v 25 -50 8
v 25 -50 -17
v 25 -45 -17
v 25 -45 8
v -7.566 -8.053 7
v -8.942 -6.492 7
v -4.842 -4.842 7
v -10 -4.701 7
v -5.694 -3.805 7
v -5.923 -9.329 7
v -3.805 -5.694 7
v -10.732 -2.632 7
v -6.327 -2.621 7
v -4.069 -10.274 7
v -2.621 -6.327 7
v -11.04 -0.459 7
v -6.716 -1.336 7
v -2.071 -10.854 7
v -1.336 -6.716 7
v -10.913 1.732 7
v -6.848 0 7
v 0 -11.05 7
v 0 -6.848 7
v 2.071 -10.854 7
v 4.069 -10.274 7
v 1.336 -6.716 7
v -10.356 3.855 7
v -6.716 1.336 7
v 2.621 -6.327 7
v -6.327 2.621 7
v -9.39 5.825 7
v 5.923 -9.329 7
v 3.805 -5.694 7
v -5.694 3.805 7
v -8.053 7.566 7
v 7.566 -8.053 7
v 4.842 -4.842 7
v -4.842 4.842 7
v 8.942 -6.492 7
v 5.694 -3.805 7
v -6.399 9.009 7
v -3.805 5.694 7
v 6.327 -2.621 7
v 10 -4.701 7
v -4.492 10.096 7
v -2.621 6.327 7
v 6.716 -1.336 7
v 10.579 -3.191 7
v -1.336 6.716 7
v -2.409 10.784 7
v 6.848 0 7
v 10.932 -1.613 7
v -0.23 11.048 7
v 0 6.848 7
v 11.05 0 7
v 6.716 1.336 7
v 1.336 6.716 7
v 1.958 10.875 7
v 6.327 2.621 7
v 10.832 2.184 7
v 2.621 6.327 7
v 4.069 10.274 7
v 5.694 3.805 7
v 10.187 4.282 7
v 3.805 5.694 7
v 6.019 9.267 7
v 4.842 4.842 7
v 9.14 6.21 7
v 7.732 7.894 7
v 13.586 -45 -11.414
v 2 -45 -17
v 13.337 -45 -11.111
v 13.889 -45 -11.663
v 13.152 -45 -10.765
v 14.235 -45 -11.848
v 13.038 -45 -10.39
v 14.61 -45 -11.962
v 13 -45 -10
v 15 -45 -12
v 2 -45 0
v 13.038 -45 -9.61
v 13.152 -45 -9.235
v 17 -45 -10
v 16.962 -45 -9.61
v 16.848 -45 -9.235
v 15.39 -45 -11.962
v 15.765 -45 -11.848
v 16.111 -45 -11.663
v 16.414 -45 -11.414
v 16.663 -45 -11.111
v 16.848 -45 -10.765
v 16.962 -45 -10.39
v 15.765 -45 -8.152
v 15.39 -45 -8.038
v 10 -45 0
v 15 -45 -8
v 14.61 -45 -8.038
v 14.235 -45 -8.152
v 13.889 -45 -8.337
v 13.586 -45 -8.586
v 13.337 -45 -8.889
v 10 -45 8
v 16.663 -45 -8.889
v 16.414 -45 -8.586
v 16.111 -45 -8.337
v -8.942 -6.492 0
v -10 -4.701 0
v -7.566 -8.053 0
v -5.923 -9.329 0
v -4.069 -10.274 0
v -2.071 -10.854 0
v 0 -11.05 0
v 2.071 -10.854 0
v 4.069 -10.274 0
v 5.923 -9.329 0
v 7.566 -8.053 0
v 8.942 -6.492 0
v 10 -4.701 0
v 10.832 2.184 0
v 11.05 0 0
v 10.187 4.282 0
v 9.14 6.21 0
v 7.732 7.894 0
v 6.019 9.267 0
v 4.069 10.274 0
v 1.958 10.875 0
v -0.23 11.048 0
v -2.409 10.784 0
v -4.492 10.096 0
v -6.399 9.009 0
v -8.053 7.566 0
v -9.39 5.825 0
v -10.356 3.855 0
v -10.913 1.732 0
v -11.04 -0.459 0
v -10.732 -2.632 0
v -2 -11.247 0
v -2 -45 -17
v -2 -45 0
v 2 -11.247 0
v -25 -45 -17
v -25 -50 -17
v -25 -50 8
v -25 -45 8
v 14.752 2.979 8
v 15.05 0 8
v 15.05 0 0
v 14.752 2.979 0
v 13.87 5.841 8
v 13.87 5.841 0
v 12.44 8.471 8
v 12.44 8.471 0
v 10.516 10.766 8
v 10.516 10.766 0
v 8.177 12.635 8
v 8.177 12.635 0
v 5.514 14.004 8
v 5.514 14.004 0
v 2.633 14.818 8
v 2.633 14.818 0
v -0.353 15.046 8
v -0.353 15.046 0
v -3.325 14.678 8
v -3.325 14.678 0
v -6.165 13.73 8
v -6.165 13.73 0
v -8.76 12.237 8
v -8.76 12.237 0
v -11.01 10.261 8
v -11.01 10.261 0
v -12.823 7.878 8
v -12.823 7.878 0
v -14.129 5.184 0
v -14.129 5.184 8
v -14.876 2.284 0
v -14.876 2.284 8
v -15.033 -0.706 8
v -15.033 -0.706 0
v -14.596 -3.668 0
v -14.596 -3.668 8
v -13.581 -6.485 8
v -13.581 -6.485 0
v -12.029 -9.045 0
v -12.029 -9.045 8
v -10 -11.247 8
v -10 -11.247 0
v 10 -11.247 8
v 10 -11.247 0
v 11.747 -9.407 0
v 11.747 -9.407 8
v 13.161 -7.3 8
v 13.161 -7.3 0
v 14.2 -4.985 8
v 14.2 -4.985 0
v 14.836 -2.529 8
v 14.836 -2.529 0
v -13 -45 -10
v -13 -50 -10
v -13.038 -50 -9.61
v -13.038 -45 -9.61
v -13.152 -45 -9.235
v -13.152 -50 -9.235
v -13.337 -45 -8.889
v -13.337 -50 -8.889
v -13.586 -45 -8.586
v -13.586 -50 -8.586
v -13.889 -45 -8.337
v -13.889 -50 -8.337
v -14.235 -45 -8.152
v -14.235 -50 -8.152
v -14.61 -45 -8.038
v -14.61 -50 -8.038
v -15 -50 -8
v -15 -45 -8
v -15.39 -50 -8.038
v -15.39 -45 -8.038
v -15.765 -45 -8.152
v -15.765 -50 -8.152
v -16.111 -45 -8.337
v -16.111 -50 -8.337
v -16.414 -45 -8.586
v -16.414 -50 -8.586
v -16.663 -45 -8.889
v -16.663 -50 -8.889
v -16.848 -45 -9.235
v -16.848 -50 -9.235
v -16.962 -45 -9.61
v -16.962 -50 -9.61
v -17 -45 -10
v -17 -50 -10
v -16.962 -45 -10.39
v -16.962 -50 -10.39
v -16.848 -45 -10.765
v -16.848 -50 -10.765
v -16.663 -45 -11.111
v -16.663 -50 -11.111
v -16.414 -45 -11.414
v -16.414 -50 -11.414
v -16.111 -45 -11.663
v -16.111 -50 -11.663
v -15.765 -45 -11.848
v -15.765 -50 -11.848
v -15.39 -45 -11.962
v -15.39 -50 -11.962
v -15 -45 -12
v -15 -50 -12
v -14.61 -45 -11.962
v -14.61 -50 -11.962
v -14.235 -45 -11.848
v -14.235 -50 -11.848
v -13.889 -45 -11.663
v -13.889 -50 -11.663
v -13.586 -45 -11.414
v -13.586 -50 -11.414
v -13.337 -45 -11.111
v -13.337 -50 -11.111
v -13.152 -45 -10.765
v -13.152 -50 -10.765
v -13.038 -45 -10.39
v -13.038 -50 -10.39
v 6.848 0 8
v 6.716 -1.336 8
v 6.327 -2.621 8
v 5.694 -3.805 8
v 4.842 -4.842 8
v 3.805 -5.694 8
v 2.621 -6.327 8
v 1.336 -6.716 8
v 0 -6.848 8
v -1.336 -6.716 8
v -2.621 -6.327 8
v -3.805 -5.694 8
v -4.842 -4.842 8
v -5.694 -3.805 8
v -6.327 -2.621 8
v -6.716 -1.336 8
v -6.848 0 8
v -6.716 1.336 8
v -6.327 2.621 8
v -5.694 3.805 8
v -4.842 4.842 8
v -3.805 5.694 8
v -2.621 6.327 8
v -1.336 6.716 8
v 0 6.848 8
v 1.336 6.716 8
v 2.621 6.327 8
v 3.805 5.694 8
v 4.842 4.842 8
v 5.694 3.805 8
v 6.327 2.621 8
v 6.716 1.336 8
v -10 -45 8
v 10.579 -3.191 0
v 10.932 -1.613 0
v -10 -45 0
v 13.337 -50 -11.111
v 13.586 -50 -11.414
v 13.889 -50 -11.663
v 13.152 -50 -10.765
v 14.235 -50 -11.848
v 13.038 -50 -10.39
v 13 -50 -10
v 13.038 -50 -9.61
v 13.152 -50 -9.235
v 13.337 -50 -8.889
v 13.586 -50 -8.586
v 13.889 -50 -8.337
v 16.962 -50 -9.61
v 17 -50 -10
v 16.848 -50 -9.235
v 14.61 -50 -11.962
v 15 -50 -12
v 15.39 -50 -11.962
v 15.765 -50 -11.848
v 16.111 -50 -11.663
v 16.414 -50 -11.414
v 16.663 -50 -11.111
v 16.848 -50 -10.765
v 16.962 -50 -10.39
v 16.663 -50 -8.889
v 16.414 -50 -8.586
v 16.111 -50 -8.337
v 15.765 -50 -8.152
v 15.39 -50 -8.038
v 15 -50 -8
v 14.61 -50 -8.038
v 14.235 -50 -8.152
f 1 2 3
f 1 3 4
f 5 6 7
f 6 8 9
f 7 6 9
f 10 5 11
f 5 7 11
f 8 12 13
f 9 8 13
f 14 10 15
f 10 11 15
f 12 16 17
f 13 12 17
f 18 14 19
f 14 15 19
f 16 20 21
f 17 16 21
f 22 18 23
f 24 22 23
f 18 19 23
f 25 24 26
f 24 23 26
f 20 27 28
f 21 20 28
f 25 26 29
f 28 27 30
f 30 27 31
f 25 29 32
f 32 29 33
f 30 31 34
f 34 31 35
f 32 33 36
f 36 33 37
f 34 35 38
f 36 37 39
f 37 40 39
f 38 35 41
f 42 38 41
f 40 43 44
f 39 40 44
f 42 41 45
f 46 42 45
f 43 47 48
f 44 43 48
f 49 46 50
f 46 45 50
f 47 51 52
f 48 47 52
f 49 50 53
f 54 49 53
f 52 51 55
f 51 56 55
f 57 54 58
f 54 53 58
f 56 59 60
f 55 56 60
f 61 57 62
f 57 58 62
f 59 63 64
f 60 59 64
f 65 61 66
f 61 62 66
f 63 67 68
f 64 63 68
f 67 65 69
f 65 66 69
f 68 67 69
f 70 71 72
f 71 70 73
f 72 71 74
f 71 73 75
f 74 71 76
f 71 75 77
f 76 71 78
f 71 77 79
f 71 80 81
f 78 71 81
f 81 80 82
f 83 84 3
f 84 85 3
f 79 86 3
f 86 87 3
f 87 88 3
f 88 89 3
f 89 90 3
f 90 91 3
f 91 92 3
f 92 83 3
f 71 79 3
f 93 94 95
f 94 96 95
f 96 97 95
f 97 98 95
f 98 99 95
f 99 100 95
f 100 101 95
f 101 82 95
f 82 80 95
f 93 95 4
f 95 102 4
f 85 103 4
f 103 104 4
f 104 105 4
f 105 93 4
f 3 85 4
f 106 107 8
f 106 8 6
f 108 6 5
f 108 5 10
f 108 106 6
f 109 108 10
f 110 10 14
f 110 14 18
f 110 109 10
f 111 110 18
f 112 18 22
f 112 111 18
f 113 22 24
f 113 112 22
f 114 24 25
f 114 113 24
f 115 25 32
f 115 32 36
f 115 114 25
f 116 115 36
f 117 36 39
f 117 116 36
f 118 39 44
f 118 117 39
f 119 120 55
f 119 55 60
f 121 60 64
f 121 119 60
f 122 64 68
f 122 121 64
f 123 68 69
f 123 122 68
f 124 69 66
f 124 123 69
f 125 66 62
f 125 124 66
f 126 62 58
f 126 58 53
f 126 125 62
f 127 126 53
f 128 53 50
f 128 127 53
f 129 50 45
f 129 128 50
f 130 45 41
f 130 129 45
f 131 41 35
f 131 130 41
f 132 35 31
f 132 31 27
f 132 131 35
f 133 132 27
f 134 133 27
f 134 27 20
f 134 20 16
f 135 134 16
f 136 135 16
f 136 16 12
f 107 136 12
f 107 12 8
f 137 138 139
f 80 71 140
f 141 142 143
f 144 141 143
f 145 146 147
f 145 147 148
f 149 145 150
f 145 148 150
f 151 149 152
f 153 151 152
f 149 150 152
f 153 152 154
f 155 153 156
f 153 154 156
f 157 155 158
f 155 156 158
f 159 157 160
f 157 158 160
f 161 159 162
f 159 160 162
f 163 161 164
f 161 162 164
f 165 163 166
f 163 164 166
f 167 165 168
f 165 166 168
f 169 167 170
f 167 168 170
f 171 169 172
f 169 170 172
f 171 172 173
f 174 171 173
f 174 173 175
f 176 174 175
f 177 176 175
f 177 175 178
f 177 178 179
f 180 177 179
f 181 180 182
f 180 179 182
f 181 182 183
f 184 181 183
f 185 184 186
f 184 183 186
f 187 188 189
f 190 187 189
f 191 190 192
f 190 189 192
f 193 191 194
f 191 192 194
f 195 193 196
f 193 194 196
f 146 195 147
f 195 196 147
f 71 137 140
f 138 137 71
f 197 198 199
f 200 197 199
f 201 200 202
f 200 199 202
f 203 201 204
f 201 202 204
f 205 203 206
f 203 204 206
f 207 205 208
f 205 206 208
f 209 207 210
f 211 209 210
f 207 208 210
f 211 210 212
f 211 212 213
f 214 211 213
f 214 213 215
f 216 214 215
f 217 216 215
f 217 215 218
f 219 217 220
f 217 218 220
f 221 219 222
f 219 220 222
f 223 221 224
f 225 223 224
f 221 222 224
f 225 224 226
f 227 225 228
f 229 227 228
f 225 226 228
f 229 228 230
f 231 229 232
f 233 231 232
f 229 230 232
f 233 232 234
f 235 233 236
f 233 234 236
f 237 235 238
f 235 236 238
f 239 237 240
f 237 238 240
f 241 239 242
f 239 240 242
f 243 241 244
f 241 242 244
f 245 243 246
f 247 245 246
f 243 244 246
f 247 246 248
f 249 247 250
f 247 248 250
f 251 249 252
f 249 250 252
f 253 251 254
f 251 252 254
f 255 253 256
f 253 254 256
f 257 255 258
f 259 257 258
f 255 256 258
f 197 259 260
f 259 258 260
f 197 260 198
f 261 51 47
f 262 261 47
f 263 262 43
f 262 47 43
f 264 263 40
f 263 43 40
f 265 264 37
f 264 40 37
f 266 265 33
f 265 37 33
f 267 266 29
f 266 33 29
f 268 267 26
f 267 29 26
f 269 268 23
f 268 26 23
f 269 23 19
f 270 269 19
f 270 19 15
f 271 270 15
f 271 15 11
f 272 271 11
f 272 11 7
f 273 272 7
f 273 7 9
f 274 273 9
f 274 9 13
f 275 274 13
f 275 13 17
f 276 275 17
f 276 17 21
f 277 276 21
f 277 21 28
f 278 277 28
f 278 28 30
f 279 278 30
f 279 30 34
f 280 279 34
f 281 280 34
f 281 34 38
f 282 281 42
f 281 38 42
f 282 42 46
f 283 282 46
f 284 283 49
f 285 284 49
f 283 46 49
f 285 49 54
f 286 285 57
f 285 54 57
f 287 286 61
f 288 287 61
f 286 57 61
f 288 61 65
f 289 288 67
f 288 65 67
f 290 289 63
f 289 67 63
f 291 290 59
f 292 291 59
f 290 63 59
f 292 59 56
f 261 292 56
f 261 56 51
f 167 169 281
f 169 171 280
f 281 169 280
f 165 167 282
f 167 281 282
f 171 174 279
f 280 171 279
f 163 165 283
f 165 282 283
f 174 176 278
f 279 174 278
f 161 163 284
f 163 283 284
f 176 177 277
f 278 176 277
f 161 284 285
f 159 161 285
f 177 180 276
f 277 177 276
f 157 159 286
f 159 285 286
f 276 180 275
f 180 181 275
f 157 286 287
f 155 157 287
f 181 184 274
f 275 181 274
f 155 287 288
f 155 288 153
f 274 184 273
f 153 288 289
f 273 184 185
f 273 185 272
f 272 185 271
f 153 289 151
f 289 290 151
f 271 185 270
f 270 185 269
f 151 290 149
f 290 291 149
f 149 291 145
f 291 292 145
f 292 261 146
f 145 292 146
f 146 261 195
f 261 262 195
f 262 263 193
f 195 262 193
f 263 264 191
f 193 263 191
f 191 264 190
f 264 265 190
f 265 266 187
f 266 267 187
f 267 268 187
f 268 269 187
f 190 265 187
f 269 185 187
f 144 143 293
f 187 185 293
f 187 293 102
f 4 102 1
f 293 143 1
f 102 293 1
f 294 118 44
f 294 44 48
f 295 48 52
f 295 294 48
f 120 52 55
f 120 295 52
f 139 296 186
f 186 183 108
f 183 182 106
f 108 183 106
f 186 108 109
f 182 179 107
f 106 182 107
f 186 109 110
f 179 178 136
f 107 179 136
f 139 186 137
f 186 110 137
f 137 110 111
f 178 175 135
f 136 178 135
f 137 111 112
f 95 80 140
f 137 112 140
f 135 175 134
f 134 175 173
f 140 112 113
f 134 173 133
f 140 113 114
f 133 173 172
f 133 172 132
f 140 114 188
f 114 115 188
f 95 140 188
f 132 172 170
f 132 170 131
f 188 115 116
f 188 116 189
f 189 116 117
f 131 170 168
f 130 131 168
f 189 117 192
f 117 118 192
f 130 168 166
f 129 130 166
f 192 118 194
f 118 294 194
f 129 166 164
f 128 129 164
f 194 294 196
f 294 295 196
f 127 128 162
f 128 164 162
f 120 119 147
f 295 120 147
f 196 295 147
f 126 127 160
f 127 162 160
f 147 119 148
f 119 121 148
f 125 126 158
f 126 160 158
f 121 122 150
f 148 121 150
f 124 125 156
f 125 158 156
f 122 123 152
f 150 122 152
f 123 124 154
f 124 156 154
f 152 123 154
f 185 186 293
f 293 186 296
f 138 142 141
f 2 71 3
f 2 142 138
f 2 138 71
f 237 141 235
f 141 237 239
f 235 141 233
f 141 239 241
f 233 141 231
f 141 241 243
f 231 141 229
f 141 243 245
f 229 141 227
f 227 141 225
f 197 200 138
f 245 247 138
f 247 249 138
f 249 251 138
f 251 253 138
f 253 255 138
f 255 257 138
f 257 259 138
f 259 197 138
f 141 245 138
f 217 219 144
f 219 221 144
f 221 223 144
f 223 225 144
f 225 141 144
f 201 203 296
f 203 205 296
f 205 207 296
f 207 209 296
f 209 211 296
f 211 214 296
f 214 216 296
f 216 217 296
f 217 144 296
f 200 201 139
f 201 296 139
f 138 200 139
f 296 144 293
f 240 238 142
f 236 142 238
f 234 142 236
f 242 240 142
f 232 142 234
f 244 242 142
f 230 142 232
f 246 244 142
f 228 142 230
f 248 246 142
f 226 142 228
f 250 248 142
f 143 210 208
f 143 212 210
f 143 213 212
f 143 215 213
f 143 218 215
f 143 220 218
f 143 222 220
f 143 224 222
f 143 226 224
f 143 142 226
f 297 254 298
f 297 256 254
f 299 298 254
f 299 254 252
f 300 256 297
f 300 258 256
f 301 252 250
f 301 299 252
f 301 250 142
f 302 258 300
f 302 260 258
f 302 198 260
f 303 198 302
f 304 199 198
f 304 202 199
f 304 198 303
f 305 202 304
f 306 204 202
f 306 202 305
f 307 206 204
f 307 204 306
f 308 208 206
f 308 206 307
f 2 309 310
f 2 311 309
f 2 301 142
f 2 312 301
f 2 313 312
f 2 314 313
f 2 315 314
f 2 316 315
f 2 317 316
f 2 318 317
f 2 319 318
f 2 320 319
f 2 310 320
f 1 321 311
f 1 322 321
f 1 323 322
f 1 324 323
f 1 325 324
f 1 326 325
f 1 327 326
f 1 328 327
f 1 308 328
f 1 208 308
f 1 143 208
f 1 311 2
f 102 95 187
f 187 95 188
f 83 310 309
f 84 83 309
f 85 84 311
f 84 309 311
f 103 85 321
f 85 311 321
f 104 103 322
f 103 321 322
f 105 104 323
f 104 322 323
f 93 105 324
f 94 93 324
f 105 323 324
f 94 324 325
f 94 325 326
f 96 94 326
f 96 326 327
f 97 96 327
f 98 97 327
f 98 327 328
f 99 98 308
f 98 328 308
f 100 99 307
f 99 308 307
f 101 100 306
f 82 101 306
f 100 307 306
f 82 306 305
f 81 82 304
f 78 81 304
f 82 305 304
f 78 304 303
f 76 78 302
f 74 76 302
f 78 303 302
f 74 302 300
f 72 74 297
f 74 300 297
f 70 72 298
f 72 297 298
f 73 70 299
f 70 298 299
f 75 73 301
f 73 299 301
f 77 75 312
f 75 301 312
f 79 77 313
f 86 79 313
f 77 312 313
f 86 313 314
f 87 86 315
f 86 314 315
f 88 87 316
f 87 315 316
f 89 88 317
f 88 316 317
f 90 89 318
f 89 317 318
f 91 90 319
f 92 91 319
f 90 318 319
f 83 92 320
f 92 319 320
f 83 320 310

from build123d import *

# Parameters (mm, degrees)
SKETCH1_R                = 6.847967297
BOSS_EXTRUDE1_DEPTH      = 8
SKETCH1_3_R              = 11.05
SKETCH1_3_R_2            = 6.847967297
CUT_EXTRUDE1_DEPTH       = 7
SKETCH2_W                = 50
SKETCH2_H                = 25
SKETCH2_R                = 2
BOSS_EXTRUDE2_DEPTH      = 5
BOSS_EXTRUDE3_DEPTH      = 2
BOSS_EXTRUDE3_DEPTH_BACK = 2


with BuildPart() as part:
    # Sketch1 → Boss-Extrude1 (new body)
    with BuildSketch(Plane.XY):
        with BuildLine():
            ThreePointArc((10, -11.247333017), (0, 15.05), (-10, -11.247333017))
            Line((-10, -11.247333017), (-10, -50))
            Line((-10, -50), (10, -50))
            Line((10, -50), (10, -11.247333017))
        make_face()
        Circle(SKETCH1_R, mode=Mode.SUBTRACT)
    extrude(amount=BOSS_EXTRUDE1_DEPTH)

    # Sketch1<3> → Cut-Extrude1 (cut)
    with BuildSketch(Plane.XY):
        Circle(SKETCH1_3_R)
        Circle(SKETCH1_3_R_2, mode=Mode.SUBTRACT)
    extrude(amount=CUT_EXTRUDE1_DEPTH, mode=Mode.SUBTRACT)

    # Sketch2 → Boss-Extrude2 (add)
    with BuildSketch(Plane.XZ.offset(50)):
        with Locations((0, -4.5)):
            Rectangle(SKETCH2_W, SKETCH2_H)
        with Locations((-15, -10)):
            Circle(SKETCH2_R, mode=Mode.SUBTRACT)
        with Locations((15, -10)):
            Circle(SKETCH2_R, mode=Mode.SUBTRACT)
    extrude(amount=-BOSS_EXTRUDE2_DEPTH)

    # Sketch5 → Boss-Extrude3 (add, two sides: drawn at the far end of the back side and taken through both)
    with BuildSketch(Plane(origin=(0, 0, 0), x_dir=(0, 0, -1), z_dir=(1, 0, 0)).offset(-BOSS_EXTRUDE3_DEPTH_BACK)):
        Polygon((0, -11.247333017), (17, -45), (0, -45), align=None)
    extrude(amount=BOSS_EXTRUDE3_DEPTH + BOSS_EXTRUDE3_DEPTH_BACK)


solid = part.part
